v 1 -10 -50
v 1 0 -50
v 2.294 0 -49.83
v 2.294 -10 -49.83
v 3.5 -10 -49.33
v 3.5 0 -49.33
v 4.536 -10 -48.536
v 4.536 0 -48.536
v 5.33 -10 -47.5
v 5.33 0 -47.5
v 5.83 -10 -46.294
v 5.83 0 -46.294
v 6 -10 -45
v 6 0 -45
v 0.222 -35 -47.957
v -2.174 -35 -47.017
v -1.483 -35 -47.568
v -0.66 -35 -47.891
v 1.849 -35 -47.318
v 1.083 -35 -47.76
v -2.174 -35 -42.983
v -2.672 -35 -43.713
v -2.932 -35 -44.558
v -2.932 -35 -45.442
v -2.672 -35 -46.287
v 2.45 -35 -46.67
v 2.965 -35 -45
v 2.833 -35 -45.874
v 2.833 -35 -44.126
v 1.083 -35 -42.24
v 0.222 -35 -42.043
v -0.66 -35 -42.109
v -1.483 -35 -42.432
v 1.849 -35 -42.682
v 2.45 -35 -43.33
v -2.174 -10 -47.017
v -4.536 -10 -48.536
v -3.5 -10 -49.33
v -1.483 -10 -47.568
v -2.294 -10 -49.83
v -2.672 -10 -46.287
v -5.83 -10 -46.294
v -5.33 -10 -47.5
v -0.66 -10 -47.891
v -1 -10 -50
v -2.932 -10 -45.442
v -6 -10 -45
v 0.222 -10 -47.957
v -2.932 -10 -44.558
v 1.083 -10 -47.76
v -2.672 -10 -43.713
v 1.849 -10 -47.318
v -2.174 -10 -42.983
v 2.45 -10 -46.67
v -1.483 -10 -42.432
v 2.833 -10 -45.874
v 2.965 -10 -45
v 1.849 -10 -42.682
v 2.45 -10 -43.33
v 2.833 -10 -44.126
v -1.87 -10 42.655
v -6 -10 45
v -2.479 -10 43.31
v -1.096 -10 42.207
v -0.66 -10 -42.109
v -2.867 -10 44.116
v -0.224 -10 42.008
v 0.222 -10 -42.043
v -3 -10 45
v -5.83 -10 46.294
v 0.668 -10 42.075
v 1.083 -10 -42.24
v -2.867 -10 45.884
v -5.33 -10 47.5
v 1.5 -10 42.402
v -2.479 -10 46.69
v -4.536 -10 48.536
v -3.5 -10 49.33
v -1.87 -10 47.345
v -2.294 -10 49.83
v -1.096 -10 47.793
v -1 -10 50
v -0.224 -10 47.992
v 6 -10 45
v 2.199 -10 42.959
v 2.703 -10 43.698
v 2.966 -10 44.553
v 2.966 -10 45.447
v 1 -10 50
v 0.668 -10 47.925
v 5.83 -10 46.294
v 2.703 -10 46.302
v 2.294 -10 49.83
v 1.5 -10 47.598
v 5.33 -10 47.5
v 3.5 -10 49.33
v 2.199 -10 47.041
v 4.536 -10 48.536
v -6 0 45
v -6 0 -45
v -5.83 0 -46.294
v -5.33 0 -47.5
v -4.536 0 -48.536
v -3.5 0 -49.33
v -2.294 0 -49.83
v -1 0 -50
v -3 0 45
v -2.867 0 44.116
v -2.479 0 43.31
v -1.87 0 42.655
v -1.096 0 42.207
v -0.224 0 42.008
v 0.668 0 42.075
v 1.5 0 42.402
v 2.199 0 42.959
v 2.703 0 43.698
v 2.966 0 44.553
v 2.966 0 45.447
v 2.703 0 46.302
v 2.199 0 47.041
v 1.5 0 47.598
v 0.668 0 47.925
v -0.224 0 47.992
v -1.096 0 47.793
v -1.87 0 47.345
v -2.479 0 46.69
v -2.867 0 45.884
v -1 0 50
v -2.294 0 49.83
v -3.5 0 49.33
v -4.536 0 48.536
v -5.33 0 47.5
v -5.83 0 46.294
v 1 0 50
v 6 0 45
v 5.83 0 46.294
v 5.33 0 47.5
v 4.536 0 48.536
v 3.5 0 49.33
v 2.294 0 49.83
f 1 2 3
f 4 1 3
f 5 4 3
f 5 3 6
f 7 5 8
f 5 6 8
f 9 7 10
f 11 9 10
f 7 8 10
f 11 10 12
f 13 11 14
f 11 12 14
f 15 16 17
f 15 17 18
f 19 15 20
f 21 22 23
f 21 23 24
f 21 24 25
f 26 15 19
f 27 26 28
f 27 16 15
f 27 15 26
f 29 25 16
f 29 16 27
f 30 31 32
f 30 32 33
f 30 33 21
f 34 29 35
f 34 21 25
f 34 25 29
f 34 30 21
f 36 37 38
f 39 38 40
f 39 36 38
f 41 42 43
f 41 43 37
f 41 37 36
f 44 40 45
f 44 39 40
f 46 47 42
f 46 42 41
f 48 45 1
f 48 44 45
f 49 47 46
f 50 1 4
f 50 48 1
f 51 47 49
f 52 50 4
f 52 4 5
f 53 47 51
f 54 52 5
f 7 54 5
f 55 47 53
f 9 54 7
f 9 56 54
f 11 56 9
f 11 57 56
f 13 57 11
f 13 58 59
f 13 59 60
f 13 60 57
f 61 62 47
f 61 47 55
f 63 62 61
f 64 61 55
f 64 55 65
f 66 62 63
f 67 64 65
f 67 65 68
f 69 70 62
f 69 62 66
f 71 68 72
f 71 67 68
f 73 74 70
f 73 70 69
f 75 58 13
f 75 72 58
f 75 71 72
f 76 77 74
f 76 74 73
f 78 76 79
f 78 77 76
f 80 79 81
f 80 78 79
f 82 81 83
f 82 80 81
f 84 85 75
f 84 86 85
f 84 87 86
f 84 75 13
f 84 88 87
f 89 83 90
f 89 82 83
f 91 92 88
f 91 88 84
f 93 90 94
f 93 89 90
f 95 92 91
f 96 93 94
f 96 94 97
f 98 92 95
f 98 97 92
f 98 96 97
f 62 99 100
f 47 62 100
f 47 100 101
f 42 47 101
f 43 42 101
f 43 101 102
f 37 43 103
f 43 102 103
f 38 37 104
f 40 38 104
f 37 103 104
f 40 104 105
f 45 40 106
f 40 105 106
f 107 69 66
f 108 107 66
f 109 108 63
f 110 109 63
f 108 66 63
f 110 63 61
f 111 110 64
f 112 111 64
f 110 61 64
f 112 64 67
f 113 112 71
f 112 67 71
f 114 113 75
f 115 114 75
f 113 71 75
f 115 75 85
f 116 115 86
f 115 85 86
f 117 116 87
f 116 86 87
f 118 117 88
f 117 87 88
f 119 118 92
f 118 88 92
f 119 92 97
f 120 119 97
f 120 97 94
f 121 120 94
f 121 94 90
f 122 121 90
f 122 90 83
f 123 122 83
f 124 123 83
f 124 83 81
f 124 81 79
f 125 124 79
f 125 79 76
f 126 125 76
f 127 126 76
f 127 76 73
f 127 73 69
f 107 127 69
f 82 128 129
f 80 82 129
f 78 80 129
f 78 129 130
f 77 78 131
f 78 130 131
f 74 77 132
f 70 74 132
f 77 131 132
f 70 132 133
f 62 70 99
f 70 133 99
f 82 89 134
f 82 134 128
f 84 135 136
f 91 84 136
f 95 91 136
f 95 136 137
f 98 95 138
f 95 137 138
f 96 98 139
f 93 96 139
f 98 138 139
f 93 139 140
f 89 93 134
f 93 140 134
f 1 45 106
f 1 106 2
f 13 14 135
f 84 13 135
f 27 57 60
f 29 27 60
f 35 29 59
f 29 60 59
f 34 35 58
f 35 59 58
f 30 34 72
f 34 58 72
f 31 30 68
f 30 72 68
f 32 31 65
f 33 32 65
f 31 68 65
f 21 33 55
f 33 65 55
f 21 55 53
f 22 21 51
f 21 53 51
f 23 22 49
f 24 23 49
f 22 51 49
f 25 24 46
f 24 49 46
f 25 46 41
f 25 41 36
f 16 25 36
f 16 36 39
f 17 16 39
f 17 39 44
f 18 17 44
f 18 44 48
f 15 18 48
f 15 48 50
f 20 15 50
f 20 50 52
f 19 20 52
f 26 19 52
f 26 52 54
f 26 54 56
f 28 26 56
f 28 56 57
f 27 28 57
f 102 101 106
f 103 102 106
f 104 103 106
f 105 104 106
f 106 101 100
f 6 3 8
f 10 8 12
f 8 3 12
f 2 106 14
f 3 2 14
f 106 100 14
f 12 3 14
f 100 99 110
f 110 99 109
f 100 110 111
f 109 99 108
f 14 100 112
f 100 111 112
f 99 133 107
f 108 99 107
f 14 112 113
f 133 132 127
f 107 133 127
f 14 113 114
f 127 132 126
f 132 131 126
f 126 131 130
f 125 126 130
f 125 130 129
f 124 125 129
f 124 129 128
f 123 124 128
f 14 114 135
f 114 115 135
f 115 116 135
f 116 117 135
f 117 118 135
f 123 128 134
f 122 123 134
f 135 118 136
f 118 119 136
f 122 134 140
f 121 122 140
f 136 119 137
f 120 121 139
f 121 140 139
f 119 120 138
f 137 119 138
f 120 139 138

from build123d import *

# Parameters (mm, degrees)
F0_R     = 2.9651856051
F1_DEPTH = 10
F2_DEPTH = 35
F3_D     = 6


with BuildPart() as f1:
    # F0 (on Front) → F1 (new body)
    with BuildSketch(Plane.XZ):
        with BuildLine():
            Line((1, 50), (-1, 50))
            ThreePointArc((-1, 50), (-4.5355339059, 48.5355339059), (-6, 45))
            Line((-6, 45), (-6, -45))
            ThreePointArc((-6, -45), (-4.5355339059, -48.5355339059), (-1, -50))
            Line((-1, -50), (1, -50))
            ThreePointArc((1, -50), (4.5355339059, -48.5355339059), (6, -45))
            Line((6, -45), (6, 45))
            ThreePointArc((6, 45), (4.5355339059, 48.5355339059), (1, 50))
        make_face()
        with Locations((0, -45)):
            Circle(F0_R, mode=Mode.SUBTRACT)
        with Locations((0, -45)):
            Circle(F0_R)
    extrude(amount=F1_DEPTH)

    # F0 (on Front) → F2 (join)
    with BuildSketch(Plane.XZ):
        with Locations((0, -45)):
            Circle(F0_R)
    extrude(amount=F2_DEPTH)

    # F3 (through all)
    with Locations(Plane(origin=(0, 0, 0), x_dir=(1, 0, 0), z_dir=(0, 1, 0))):
        with Locations((0, -45)):
            Hole(F3_D / 2)


solid = f1.part
